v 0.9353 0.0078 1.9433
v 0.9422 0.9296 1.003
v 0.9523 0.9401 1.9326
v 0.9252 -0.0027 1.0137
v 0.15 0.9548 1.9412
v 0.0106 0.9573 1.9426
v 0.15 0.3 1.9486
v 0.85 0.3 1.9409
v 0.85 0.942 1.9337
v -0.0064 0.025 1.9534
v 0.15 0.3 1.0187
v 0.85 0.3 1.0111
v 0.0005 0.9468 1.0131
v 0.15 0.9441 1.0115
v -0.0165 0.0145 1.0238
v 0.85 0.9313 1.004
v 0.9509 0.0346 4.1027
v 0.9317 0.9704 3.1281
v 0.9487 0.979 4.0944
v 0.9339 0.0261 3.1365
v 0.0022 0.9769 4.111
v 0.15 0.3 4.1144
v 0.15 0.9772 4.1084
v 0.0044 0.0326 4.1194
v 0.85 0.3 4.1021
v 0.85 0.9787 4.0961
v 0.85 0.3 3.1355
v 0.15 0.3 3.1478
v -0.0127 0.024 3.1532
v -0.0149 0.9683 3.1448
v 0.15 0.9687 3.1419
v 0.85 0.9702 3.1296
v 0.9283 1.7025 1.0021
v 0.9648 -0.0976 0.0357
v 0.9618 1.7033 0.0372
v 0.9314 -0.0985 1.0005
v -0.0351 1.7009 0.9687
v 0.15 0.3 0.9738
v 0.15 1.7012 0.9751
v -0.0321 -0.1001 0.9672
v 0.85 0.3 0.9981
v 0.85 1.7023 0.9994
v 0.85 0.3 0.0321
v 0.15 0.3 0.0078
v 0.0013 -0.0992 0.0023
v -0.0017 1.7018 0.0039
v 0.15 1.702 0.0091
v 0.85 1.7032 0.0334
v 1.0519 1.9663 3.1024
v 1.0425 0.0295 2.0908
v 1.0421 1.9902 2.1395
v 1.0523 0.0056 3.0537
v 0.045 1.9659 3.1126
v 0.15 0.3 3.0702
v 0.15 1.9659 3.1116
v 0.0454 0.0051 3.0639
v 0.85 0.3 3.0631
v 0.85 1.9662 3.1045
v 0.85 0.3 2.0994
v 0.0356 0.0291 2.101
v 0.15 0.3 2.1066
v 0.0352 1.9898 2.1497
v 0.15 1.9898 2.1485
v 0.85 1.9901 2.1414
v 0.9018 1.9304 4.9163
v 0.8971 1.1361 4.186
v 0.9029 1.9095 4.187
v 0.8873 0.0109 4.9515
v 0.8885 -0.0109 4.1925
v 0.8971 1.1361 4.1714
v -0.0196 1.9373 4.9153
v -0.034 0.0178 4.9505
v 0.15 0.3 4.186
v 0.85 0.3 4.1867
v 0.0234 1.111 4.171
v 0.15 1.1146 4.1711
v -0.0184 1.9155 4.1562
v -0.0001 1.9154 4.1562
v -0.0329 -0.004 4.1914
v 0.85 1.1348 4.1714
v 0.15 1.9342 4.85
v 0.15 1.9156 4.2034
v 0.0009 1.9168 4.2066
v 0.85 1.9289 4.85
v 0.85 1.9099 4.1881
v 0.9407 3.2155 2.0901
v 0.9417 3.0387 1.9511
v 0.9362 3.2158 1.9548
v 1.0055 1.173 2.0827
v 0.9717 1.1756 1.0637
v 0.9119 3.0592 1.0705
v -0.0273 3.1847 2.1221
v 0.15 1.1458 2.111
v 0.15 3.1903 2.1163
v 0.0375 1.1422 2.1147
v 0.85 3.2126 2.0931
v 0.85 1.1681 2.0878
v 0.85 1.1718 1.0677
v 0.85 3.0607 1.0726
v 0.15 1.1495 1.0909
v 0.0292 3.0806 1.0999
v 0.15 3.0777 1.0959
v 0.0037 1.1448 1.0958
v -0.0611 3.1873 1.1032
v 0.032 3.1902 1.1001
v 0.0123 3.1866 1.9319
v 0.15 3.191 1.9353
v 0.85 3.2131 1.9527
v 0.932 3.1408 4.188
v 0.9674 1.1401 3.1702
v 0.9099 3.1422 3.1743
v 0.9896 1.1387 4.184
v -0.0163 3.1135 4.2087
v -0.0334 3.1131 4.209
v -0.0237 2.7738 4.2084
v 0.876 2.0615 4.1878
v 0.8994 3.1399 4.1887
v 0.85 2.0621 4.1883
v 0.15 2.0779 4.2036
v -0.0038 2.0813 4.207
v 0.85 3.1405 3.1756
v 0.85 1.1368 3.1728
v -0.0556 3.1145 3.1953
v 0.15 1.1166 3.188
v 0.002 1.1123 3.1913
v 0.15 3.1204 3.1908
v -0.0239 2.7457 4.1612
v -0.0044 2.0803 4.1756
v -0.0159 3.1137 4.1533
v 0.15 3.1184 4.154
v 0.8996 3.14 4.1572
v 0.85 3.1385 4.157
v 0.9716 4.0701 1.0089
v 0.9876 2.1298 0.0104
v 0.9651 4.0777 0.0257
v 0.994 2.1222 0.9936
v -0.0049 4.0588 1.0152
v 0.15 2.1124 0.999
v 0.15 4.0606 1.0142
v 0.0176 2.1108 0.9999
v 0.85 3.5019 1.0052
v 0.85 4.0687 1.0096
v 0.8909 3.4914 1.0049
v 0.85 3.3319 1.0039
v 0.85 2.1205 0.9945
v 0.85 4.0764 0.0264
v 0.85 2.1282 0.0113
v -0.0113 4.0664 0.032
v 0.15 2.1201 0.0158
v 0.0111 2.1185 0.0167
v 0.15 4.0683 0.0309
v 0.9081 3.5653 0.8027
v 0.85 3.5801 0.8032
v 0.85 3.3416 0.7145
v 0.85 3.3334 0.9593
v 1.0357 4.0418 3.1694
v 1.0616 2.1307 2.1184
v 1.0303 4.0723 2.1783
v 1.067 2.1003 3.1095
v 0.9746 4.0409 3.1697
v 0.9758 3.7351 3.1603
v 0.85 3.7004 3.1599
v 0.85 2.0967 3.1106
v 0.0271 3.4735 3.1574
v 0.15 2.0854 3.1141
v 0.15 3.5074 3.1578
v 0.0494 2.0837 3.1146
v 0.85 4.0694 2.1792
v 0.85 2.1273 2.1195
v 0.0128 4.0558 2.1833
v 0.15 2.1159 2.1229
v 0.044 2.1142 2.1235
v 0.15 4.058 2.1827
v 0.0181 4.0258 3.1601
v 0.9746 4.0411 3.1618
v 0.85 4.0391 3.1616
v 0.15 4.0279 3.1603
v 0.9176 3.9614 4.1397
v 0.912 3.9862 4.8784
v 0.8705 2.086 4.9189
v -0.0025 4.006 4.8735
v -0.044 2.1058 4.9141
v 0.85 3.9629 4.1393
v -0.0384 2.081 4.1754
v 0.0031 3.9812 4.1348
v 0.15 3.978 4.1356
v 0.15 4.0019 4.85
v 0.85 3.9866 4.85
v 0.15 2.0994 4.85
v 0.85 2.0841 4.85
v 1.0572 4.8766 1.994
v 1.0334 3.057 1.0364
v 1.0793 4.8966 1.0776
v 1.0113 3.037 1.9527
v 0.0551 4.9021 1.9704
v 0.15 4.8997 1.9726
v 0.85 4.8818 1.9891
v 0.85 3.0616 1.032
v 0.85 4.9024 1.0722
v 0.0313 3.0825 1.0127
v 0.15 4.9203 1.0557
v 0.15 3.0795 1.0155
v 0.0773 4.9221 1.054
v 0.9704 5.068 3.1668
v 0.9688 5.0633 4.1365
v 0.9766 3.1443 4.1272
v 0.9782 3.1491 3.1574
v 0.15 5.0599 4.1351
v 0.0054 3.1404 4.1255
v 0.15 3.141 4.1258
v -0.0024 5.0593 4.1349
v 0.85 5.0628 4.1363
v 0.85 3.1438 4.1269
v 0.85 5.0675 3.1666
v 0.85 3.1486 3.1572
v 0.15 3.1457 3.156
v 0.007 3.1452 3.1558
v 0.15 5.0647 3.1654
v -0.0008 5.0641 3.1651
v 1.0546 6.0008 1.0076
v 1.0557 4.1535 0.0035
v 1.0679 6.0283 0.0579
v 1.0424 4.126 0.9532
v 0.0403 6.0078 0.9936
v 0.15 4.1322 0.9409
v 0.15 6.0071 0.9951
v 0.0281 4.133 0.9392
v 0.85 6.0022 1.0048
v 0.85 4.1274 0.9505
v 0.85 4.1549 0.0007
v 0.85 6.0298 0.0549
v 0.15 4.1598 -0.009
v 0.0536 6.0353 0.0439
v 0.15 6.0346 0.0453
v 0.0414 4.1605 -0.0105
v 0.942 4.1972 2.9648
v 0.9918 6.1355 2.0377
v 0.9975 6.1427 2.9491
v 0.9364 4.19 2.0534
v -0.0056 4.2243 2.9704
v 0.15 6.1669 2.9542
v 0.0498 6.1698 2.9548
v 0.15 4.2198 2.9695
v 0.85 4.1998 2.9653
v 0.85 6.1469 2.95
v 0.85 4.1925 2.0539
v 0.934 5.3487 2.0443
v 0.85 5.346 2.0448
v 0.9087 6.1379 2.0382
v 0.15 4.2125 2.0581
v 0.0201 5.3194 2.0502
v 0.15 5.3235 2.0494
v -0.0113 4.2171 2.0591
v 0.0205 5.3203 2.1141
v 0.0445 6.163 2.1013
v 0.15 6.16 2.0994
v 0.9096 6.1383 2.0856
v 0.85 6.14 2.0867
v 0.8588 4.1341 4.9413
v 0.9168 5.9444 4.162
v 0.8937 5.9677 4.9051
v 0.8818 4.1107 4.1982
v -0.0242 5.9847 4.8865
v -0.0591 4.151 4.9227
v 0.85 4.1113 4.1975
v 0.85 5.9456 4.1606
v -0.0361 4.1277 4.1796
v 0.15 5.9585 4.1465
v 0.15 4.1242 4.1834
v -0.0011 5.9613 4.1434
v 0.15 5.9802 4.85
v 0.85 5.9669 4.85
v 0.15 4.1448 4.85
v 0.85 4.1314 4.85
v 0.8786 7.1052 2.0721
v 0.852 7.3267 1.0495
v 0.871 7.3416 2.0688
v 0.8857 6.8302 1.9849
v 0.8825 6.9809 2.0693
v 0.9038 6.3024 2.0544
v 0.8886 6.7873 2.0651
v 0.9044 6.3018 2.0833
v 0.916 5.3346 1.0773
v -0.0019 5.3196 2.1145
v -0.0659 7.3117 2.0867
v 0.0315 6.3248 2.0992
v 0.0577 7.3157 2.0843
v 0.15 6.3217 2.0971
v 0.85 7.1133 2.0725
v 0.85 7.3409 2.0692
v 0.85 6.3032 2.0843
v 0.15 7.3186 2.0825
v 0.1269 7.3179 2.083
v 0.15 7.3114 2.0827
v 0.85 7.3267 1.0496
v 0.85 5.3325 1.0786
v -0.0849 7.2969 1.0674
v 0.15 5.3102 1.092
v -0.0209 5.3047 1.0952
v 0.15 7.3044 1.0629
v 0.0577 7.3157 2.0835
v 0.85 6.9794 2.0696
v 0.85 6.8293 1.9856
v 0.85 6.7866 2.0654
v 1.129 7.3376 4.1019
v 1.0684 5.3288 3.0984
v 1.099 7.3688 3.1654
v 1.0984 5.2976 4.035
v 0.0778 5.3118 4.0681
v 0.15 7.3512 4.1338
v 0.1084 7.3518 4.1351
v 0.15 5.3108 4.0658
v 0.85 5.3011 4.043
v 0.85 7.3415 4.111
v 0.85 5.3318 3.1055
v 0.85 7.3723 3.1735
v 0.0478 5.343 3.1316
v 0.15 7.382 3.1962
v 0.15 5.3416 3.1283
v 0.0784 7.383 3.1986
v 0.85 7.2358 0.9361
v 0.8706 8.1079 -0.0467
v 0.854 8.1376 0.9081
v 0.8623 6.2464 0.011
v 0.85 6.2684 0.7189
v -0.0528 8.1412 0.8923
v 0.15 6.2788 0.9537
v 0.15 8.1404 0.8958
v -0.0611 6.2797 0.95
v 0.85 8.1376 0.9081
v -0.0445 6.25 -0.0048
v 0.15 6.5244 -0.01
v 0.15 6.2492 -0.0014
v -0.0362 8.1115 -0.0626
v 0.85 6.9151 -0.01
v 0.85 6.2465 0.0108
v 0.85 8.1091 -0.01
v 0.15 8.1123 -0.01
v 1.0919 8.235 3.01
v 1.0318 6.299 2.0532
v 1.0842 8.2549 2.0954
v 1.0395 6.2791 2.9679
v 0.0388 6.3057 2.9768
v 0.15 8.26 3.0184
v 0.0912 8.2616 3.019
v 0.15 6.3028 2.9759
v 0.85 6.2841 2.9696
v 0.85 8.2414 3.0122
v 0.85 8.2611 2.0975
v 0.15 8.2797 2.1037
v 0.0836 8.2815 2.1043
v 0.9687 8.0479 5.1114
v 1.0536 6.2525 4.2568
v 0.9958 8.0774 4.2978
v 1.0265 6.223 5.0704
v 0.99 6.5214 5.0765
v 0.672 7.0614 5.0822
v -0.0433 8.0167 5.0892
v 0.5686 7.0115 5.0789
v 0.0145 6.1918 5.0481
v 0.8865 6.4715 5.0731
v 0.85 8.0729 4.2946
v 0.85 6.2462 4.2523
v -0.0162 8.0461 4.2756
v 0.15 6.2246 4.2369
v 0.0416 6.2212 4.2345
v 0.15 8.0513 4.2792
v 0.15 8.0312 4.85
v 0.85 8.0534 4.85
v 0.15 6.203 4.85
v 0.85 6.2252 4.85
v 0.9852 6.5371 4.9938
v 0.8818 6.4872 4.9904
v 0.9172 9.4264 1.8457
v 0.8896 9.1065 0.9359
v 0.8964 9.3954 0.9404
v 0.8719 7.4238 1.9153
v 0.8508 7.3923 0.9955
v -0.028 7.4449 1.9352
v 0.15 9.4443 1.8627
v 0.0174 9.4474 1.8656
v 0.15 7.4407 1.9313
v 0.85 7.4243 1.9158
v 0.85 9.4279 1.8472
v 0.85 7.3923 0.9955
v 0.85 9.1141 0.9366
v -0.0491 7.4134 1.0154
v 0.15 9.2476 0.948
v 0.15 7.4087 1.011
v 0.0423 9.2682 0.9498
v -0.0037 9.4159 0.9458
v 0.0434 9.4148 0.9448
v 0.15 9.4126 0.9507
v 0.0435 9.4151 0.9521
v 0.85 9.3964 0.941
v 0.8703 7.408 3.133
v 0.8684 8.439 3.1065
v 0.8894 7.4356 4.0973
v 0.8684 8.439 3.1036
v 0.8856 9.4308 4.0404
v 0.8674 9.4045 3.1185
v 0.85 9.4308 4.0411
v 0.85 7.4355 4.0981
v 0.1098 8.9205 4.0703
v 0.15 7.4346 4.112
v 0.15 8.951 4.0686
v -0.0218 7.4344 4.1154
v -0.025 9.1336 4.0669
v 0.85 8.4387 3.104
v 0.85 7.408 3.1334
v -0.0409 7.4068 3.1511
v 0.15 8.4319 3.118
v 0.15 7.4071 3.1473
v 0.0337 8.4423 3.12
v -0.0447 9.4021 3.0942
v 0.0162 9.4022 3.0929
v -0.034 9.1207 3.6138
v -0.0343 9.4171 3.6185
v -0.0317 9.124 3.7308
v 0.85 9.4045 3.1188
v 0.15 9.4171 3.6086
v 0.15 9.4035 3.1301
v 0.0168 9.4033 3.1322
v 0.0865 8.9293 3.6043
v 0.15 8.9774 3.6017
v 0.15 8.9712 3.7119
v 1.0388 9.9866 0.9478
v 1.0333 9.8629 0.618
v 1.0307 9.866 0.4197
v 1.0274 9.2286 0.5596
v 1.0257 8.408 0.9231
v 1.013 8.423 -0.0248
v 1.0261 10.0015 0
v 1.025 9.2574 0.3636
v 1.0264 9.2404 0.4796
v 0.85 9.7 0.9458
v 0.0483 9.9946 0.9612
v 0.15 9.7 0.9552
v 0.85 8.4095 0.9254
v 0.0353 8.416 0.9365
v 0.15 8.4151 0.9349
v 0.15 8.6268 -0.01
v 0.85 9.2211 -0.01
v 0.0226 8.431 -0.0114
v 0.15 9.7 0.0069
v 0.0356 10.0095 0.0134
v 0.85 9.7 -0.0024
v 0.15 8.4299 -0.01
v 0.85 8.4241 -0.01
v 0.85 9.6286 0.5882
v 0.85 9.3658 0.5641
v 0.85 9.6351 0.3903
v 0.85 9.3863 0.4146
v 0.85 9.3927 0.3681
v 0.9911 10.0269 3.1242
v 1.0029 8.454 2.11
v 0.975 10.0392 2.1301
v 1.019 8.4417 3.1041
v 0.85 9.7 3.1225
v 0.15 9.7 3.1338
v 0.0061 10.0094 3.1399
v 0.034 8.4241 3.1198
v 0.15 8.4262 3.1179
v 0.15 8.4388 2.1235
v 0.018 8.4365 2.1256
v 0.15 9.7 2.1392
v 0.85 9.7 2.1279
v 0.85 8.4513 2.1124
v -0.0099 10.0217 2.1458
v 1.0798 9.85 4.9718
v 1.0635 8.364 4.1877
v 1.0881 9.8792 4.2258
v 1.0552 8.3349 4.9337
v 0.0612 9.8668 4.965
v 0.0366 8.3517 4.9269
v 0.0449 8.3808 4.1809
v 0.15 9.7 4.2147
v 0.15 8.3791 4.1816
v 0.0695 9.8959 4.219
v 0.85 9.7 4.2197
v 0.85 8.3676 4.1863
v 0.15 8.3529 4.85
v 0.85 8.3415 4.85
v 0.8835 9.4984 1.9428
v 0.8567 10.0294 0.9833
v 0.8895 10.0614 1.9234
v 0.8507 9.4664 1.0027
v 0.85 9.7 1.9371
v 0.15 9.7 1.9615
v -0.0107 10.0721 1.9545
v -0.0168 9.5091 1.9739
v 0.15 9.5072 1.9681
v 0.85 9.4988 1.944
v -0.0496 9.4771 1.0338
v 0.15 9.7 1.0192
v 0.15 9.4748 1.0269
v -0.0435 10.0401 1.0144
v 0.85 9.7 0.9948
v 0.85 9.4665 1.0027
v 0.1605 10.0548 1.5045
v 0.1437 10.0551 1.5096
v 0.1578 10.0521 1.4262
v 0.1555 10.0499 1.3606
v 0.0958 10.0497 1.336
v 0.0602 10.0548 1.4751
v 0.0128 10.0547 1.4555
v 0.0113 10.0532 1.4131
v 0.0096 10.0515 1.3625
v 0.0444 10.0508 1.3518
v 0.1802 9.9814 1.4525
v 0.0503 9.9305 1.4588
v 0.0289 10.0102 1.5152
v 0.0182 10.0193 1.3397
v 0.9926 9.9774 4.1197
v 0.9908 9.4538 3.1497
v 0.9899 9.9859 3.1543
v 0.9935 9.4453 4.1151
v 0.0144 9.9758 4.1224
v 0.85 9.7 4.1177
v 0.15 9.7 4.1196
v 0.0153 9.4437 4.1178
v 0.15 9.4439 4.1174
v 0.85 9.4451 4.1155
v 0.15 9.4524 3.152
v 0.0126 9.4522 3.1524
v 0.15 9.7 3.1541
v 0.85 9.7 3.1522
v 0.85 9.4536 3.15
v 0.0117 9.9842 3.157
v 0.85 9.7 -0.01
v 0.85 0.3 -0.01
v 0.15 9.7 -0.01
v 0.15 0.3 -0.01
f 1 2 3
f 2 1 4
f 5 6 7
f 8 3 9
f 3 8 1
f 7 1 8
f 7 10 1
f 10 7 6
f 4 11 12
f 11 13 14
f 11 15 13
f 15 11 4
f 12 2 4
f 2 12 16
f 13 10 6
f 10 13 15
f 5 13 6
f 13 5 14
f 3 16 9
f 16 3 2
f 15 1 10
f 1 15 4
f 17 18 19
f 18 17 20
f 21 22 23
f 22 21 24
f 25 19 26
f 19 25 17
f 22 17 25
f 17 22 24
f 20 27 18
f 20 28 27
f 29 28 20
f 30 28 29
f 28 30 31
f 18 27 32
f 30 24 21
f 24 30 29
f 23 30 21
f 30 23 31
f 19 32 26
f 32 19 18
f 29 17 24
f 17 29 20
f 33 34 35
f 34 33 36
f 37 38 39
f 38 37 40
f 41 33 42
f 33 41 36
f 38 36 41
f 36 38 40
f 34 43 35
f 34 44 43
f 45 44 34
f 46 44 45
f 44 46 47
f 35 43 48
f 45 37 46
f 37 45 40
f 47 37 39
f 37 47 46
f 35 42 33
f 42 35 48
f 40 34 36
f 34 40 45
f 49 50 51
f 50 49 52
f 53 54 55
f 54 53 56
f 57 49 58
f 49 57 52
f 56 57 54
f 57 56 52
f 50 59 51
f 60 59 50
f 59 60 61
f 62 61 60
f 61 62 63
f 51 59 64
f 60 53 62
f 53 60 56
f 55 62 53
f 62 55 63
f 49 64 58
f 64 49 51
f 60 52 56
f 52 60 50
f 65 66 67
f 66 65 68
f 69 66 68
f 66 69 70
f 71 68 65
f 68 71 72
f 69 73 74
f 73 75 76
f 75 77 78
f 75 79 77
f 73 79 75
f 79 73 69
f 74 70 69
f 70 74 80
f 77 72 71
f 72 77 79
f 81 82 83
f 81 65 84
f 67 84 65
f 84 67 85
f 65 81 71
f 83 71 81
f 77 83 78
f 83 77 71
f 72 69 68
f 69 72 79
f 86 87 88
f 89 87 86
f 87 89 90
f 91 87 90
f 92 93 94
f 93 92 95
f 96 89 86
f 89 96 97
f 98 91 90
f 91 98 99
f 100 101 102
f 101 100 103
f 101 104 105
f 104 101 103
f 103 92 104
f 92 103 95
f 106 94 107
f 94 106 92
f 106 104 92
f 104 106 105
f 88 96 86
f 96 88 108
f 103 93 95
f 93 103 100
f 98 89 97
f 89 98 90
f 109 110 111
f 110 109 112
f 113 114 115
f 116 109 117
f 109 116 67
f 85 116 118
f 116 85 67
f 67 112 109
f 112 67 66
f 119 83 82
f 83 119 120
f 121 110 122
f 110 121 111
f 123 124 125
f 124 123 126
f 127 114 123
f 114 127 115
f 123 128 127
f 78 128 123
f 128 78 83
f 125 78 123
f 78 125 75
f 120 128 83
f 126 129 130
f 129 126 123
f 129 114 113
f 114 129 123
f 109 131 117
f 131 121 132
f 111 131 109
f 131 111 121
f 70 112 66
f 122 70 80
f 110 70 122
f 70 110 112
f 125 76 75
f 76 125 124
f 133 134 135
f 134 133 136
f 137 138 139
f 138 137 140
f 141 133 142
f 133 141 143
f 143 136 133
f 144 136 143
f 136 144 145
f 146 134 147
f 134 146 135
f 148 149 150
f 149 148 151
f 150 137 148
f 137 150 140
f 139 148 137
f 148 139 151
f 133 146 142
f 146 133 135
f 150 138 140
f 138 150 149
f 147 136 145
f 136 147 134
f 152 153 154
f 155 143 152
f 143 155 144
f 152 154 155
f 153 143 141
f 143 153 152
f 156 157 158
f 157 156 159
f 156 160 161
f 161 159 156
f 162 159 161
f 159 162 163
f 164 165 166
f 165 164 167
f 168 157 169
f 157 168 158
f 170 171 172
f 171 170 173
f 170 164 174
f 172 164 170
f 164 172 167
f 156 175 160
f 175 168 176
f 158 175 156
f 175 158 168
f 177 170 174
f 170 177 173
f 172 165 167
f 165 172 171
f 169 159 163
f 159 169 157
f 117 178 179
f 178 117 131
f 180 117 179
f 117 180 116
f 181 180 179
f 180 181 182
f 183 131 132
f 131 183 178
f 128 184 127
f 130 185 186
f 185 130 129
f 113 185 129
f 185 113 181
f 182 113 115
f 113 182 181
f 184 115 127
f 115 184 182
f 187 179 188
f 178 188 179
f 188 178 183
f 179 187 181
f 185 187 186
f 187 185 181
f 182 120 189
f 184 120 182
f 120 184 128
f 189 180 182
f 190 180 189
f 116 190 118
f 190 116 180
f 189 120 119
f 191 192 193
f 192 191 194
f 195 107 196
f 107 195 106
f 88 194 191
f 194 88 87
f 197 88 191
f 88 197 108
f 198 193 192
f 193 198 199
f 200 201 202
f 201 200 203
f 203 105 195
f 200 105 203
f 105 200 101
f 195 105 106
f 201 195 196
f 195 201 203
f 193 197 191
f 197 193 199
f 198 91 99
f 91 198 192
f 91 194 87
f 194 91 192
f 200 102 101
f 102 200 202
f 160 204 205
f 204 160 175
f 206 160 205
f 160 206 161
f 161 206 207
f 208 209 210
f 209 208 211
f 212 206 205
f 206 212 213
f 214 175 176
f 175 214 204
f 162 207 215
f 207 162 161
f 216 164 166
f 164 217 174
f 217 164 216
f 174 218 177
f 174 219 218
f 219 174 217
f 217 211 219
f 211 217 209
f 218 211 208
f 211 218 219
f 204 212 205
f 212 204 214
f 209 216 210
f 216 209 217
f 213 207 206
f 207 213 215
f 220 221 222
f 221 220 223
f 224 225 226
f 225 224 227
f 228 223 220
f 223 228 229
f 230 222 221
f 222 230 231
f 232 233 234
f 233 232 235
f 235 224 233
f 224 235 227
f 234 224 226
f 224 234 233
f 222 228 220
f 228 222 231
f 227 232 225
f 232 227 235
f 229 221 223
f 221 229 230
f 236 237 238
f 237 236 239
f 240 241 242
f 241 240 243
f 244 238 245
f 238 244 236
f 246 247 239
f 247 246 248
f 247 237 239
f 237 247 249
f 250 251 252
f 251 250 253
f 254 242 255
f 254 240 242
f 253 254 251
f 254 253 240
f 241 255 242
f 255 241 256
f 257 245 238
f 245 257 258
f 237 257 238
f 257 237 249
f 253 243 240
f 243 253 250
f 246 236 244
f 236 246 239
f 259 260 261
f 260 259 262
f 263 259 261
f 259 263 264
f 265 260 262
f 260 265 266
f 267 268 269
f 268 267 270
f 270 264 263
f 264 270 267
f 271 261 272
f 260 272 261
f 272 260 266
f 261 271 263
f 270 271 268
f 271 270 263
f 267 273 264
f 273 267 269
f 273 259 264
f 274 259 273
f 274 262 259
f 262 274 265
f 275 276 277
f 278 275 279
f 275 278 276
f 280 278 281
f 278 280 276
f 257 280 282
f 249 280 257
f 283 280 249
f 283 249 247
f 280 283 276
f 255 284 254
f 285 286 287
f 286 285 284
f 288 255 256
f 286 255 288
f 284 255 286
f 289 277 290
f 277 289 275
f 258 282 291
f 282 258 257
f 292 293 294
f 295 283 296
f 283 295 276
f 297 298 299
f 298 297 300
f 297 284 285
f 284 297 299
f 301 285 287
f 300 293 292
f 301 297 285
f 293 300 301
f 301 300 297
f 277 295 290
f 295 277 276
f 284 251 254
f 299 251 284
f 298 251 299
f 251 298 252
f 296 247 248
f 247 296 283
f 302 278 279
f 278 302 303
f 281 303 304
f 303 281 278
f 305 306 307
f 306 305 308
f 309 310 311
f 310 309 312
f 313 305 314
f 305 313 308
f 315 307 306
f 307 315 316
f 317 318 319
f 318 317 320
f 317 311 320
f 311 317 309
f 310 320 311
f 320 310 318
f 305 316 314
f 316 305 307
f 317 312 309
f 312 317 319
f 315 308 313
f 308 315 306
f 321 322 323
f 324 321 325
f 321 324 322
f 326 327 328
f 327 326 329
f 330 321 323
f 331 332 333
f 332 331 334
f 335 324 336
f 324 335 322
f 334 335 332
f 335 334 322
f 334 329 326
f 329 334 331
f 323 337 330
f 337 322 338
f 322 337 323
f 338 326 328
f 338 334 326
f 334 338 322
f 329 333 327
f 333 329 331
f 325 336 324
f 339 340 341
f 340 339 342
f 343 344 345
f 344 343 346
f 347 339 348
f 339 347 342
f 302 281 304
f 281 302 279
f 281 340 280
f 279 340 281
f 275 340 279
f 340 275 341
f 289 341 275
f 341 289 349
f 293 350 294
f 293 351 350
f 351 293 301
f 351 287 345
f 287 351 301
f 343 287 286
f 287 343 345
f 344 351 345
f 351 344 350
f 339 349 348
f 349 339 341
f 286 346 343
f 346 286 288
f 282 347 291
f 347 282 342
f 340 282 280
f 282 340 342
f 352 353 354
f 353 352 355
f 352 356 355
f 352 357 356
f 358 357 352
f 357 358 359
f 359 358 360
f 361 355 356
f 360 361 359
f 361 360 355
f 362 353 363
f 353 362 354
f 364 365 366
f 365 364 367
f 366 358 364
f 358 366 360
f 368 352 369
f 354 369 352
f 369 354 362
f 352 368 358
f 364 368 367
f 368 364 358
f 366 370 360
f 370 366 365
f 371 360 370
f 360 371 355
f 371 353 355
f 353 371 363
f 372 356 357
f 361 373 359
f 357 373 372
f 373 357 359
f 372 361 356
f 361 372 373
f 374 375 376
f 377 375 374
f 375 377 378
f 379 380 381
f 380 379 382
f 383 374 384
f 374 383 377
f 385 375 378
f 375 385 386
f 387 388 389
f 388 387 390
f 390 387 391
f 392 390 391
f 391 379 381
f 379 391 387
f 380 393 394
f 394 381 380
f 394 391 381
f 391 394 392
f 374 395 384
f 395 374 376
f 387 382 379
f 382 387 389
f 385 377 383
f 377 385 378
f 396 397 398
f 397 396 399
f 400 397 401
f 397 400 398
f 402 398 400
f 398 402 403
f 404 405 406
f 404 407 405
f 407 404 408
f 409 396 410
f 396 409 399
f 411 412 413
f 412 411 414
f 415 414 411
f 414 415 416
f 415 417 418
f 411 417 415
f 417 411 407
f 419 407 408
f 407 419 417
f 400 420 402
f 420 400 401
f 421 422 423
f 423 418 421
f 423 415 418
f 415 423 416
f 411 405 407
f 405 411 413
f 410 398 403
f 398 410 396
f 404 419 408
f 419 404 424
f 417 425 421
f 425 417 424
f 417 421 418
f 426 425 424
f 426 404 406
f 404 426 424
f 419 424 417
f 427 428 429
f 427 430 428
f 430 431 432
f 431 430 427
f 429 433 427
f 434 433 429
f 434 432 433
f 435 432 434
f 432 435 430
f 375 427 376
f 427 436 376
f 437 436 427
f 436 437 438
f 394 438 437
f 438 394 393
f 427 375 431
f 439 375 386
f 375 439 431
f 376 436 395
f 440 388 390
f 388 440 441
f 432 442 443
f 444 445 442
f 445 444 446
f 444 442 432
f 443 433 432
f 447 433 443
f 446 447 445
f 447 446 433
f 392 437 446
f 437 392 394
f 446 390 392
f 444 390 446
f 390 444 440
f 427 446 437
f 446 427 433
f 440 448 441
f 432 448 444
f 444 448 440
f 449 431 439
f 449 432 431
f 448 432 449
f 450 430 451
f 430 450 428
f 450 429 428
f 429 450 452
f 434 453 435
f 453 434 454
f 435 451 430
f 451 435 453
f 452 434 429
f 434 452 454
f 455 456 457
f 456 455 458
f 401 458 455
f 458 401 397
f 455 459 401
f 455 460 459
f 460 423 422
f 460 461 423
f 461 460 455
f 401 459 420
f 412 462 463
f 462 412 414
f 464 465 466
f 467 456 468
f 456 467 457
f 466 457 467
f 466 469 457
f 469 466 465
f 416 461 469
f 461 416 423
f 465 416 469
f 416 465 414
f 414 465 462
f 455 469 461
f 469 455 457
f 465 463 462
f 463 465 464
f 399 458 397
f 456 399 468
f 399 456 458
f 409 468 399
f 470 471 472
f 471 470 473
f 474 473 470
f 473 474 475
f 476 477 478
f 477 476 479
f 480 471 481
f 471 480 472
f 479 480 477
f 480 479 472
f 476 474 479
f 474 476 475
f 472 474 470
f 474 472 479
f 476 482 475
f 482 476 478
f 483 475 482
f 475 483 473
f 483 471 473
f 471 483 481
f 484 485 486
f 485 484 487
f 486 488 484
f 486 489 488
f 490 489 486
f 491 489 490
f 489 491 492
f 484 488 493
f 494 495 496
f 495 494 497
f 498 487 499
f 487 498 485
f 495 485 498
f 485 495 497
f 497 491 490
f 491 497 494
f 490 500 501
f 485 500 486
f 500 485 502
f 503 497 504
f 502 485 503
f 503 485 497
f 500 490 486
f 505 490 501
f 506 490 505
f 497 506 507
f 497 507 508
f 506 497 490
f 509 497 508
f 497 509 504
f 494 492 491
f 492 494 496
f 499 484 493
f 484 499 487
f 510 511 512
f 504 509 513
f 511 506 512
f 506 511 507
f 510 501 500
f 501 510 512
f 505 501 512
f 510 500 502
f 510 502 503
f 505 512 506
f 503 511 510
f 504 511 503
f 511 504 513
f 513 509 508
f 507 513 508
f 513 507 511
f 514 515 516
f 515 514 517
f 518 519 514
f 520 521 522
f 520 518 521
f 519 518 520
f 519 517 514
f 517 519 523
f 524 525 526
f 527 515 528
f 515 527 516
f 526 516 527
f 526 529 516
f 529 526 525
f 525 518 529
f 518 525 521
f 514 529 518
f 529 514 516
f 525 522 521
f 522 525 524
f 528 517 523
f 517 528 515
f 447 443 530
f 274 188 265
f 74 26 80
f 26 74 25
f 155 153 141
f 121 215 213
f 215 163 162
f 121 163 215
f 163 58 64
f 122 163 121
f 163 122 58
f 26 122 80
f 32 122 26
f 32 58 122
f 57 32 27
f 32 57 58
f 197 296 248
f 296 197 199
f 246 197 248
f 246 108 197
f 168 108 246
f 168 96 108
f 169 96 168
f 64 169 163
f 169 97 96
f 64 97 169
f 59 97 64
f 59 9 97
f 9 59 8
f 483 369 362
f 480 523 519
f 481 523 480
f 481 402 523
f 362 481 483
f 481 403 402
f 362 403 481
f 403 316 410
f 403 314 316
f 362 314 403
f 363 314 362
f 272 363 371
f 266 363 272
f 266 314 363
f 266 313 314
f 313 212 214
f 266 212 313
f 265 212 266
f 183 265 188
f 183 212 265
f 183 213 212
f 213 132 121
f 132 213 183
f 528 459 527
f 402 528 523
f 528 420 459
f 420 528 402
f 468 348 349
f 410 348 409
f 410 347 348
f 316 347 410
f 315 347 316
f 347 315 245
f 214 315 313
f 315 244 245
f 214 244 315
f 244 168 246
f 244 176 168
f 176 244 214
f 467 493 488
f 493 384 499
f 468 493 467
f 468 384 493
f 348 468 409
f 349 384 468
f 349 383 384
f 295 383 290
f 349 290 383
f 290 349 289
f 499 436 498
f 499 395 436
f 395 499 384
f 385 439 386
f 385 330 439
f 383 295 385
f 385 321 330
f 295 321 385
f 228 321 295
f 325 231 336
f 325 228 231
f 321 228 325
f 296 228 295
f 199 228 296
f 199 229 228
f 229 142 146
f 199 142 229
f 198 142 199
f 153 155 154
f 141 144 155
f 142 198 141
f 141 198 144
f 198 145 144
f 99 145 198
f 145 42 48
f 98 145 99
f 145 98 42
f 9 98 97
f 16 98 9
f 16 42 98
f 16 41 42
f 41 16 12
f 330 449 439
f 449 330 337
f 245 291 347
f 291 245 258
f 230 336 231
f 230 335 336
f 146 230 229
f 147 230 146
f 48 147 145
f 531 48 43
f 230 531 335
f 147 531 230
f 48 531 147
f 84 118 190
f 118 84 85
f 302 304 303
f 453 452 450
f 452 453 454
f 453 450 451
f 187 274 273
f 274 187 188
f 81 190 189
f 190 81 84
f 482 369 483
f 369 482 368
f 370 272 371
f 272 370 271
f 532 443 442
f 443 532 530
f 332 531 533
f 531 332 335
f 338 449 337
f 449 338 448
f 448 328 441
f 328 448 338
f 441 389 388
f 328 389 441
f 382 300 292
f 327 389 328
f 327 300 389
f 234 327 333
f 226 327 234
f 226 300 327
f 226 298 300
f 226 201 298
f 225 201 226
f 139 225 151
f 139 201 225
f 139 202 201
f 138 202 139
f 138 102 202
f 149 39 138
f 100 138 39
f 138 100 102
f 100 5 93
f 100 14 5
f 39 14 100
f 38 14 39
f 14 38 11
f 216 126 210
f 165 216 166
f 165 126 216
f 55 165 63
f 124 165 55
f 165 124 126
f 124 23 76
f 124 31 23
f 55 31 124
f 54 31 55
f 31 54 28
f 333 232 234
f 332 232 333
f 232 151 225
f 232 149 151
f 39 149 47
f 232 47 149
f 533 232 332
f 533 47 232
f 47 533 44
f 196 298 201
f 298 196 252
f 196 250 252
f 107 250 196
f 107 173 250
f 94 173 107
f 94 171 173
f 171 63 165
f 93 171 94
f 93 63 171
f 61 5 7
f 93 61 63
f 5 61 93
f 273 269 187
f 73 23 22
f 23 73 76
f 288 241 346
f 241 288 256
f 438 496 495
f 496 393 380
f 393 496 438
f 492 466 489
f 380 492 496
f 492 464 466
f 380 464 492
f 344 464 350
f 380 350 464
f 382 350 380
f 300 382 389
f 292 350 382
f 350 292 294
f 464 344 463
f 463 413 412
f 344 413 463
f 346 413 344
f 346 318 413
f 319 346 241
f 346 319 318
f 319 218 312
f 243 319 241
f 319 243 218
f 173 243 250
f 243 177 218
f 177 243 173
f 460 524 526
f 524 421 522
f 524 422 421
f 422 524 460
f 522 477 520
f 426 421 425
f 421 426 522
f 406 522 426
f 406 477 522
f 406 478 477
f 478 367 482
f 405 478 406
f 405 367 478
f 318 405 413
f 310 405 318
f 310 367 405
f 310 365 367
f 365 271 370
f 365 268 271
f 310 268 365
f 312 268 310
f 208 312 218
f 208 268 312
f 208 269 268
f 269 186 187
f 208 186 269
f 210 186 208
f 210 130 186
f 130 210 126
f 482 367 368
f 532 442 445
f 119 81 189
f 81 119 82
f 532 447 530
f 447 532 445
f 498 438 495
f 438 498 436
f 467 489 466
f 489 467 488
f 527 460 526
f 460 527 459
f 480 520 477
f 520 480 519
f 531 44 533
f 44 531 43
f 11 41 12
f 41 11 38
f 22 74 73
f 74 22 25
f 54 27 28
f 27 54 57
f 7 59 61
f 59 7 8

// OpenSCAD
// file: bricks/brick_mod_cracked.scad
// ======================================
// = Brick Mod random translate         =
// = Jacob Loss                         =
// = 03/08/2022                         =
// = GNU GPLv3.0                        =
// ======================================

// Randomly scale bricks between s_min, s_max
module brick_mod_cracked(
    size,
    chance = 0.25,
    min_angle = [-45, 0, -45],
    max_angle = [45, 0, 45],
    min_size = [0.05, 0.05, 0.05],
    max_size = [0.95, 0.95, 0.95],
    min_tran = [0.05, 0.05, 0.05],
    max_tran = [0.95, 0.95, 0.95],
    seed
    ){

    // Undefined global protection
    // These only sometimes work?
    size = is_undef(size) ? $bs     : size;
    seed = is_undef(seed) ? $seed   : seed;

    r_vals = rands(0, 100000, 10, seed);

    tr =[
        size[0] * rands(min_tran[0], max_tran[0], 1, r_vals[0])[0],
        size[1] * rands(min_tran[1], max_tran[1], 1, r_vals[1])[0],
        size[2] * rands(min_tran[2], max_tran[2], 1, r_vals[2])[0] 
        ];

    rot=[
        rands(min_angle[0], max_angle[0], 1, r_vals[3])[0], 
        rands(min_angle[1], max_angle[1], 1, r_vals[4])[0], 
        rands(min_angle[2], max_angle[2], 1, r_vals[5])[0] 
        ]; 

    cut=[
        size[0] * rands(0, max_size[0], 1, r_vals[6])[0],
        size[1] * rands(0, max_size[1], 1, r_vals[7])[0],
        size[2] * rands(0, max_size[2], 1, r_vals[8])[0]
        ];

    en = rands(0, 1, 1, r_vals[9])[0];
    if(en <= chance){

        difference(){

            children(0);
            translate(tr)
            rotate(rot)
            cube(cut);
    
        }
    }else{
        children(0);
    }
}
// file: bricks/brick_mod_r_tra.scad
// ======================================
// = Brick Mod random translate         =
// = Jacob Loss                         =
// = 03/08/2022                         =
// = GNU GPLv3.0                        =
// ======================================

// Randomly scale bricks between s_min, s_max
module brick_mod_r_translate(
    size,
    t_min = [-0.05, -0.05, -0.05],
    t_max = [0.05, 0.05, 0.05],
    trim = false,
    seed
    ){

    // Undefined global protection
    // These only sometimes work?
    size = is_undef(size) ? $bs     : size;
    seed = is_undef(seed) ? $seed   : seed;

    r_vals = rands(0, 100000, 3, seed);

    tr = [
        rands(size[0] * t_min[0], size[0] * t_max[0], 1, r_vals[0])[0],
        rands(size[1] * t_min[1], size[1] * t_max[1], 1, r_vals[1])[0],
        rands(size[2] * t_min[2], size[2] * t_max[2], 1, r_vals[2])[0] 
    ];

    if(trim){
        intersection(){
            translate(tr)
            children(0);
            cube(size);
        }
    } else {
        translate(tr)
        children(0);
    }
}
// file: bricks/brick_mod_r_scl.scad
// ======================================
// = Brick Mod random scale             =
// = Jacob Loss                         =
// = 03/08/2022                         =
// = GNU GPLv3.0                        =
// ======================================

// Randomly scale bricks between s_min, s_max
module brick_mod_r_scale(
    size,
    s_min = [0.95, 0.95, 0.95],
    s_max = [1.05, 1.05, 1.05],
    trim = false,
    seed
    ){

    // Undefined global protection
    // These only sometimes work?
    size = is_undef(size) ? $bs     : size;
    seed = is_undef(seed) ? $seed   : seed;

    r_vals = rands(0, 100000, 3, seed);

    sc = [
        rands(s_min[0], s_max[0], 1, r_vals[0])[0],
        rands(s_min[1], s_max[1], 1, r_vals[1])[0],
        rands(s_min[2], s_max[2], 1, r_vals[2])[0] 
    ];

    if(trim){
        intersection(){
            scale(sc)
            children(0);
            cube(size);
        }
    } else {
        scale(sc)
        children(0);
    }
}
// file: bricks/brick_mod_r_rot.scad
// ==============================================
// = Random Rotation Brick Modifier             =
// = Jacob Loss                                 =
// = 02/27/2022                                 =
// = GNU GPLv3.0                                =
// ==============================================

// Randomly rotate brick by r_max degrees
module brick_mod_r_rot(
    size,
    r_max = [5, 5, 5],
    trim = false,
    seed
    ){

    // Undefined global protection
    // These only sometimes work?
    size = is_undef(size) ? $bs     : size;
    seed = is_undef(seed) ? $seed   : seed;

    r_vals = rands(0, 100000, 3, seed);

    rot = [
        rands(-r_max[0], r_max[0], 1, r_vals[0])[0],
        rands(-r_max[1], r_max[1], 1, r_vals[1])[0],
        rands(-r_max[2], r_max[2], 1, r_vals[2])[0] 
    ];

    if(trim){
        intersection(){
            rotate(rot)
            children(0);
            cube(size);
        }
    } else {
        rotate(rot)
        children(0);
    }
}
// file: bricks/brick_round.scad
// ==============================================
// = Rounded Brick                              =
// = Jacob Loss                                 =
// = 02/27/2022                                 =
// = GNU GPLv3.0                                =
// ==============================================

// Generic Brick to be used as a template for the future
module brick_round(
    size,
    radius = 0.25    
    ){

    // Undefined global protection
    // These only sometimes work?
    size = is_undef(size) ? $bs     : size;
    // No randomness to this one
    //seed = is_undef(seed) ? $seed   : seed;

    if($d){                                                 // Debug mode (just a cube)
        cube(size);
    } else {                                                // Run mode
        intersection(){ 
        difference(){
            cube(size, center=false);
            // Cutter
            union(){
                
                translate([0, radius, radius])
                rotate([180, 0, 0])
                difference(){
                    cube([size[0], radius, radius]);
                    rotate([0, 90, 0])
                    cylinder(r = radius, h = size[0]);
                }
                
                translate([0, size[1] - radius, radius])
                rotate([-90, 0, 0])
                difference(){
                    cube([size[0], radius, radius]);
                    rotate([0, 90, 0])
                    cylinder(r = radius, h = size[0]);
                }
                
                translate([0, radius, size[2] - radius])
                rotate([90, 0, 0])
                difference(){
                    cube([size[0], radius, radius]);
                    rotate([0, 90, 0])
                    cylinder(r = radius, h = size[0]);
                }
                
                translate([0, size[1] - radius, size[2] - radius])
                rotate([0, 0, 0])
                difference(){
                    cube([size[0], radius, radius]);
                    rotate([0, 90, 0])
                    cylinder(r = radius, h = size[0]);
                }
                
                translate([radius, 0, radius])
                rotate([0, 180, 0])
                difference(){
                    cube([radius, size[1], radius]);
                    rotate([-90, 0, 0])
                    cylinder(r = radius, h = size[1]);
                }
                
                translate([size[0] - radius, 0, radius])
                rotate([0, 90, 0])
                difference(){
                    cube([radius, size[1], radius]);
                    rotate([-90, 0, 0])
                    cylinder(r = radius, h = size[1]);
                }
                
                translate([size[0] - radius, 0, size[2] - radius])
                rotate([0, 0, 0])
                difference(){
                    cube([radius, size[1], radius]);
                    rotate([-90, 0, 0])
                    cylinder(r = radius, h = size[1]);
                }
                
                translate([radius, 0, size[2] - radius])
                rotate([0, -90, 0])
                difference(){
                    cube([radius, size[1], radius]);
                    rotate([-90, 0, 0])
                    cylinder(r = radius, h = size[1]);
                }
                
                translate([radius, radius, 0])
                rotate([0, 0, 180])
                difference(){
                    cube([radius, radius, size[2]]);
                    rotate([0, 0, 0])
                    cylinder(r = radius, h = size[2]);
                }
                
                translate([radius, size[1] - radius, 0])
                rotate([0, 0, 90])
                difference(){
                    cube([radius, radius, size[2]]);
                    rotate([0, 0, 0])
                    cylinder(r = radius, h = size[2]);
                }
                
                translate([size[0] - radius, size[1] - radius, 0])
                rotate([0, 0, 0])
                difference(){
                    cube([radius, radius, size[2]]);
                    rotate([0, 0, 0])
                    cylinder(r = radius, h = size[2]);
                }
                
                translate([size[0] - radius, radius, 0])
                rotate([0, 0, -90])
                difference(){
                    cube([radius, radius, size[2]]);
                    rotate([0, 0, 0])
                    cylinder(r = radius, h = size[2]);
                }
                
                translate([radius, radius, radius])
                rotate([0, 90, 180])
                difference(){
                    cube([radius, radius, radius]);
                    sphere(r = radius * 1.01);
                }
                
                translate([size[0] - radius, size[1] - radius, radius])
                rotate([0, 90, 0])
                difference(){
                    cube([radius, radius, radius]);
                    sphere(r = radius * 1.01);
                }
                
                translate([radius, size[1] - radius, radius])
                rotate([0, 90, 90])
                difference(){
                    cube([radius, radius, radius]);
                    sphere(r = radius * 1.01);
                }
                
                translate([size[0] - radius, radius, radius])
                rotate([0, 90, -90])
                difference(){
                    cube([radius, radius, radius]);
                    sphere(r = radius * 1.01);
                }
                
                translate([size[0] - radius, size[1] - radius, size[2] - radius])
                rotate([0, 0, 0])
                difference(){
                    cube([radius, radius, radius]);
                    sphere(r = radius * 1.01);
                }
                
                translate([radius, size[1] - radius, size[2] - radius])
                rotate([0, 0, 90])
                difference(){
                    cube([radius, radius, radius]);
                    sphere(r = radius * 1.01);
                }
                
                translate([radius, radius, size[2] - radius])
                rotate([0, 0, 180])
                difference(){
                    cube([radius, radius, radius]);
                    sphere(r = radius * 1.01);
                }
                
                translate([size[0] - radius, radius, size[2] - radius])
                rotate([0, 0, -90])
                difference(){
                    cube([radius, radius, radius]);
                    sphere(r = radius * 1.01);
                }
            }
            }

            translate(size * 0.0005)
            cube(size = size * 0.999, center = false);

        }
    }
}

module _OSBK_test_suite(){
    $d = false;
    $bs = [1, 2, 1];
    $fn = 50;   
 
    for(i = [0 : 10]){
         
        //$seed = r_vals[i];
        
        translate([0, i * 2, 0])
        children(0);
    }

}

module _OSBK_test_brick_generic(){
    _OSBK_test_suite()
    brick_round();
}
_OSBK_test_brick_generic();
// file: bricks/brick_set.scad
// ======================
// = Set-o-Bricks       =
// = Jacob Loss         =
// = 01/30/2022         =
// = GNU GPLv3.0        =
// ======================

// Get generic brick (mostly for the test suite)
use <brick_generic.scad>

// Default Brick Set
// Format : [stlSize, stlFile]
_pbs_test_bricks = [
                        [[1, 2, 1], "test_brick_set/brick0.stl"],
                        [[1, 2, 1], "test_brick_set/brick1.stl"],
                        [[1, 2, 1], "test_brick_set/brick3.stl"],
                    ];

// Place a Brick based on a set of bricks
module brick_set( 
    size = [1, 2, 1],               // Size of brick
    set = _pbs_test_bricks,         // Set of brick, Entry: [[size_x, size_y, size_z], "FileName.stl"]
    stdev = 0.75,                   // Standard Deviation for random brick laying
    ){
    
    // Undefined global protection
    size = is_undef(size) ? $bs     : size;
    seed = is_undef(seed) ? $seed   : seed;
    
    if($d){

        cube(size);

    } else {
        intersection(){
            union(){
                // Random values from the $seed      
                r_vals = rands(0, 10000, 4, $seed);
     
                // Select Brick
                i       = round(r_vals[0]) % len(set);
           
                // Get Rotations
                r_x     = round(r_vals[1]) % 2;
                r_y     = round(r_vals[2]) % 4;
                r_z     = round(r_vals[3]) % 2;

                // Get all brick values and transforms
                c_brick = set[i];
                s_brick = [size[0] / c_brick[0][0], size[1] / c_brick[0][1], size[2] / c_brick[0][2]];
                r_brick = [r_x * 180, r_y * 90, r_z * 180];   
                
                // Generate Brick 
                scale(s_brick)
                translate(c_brick[0] / 2)
                rotate([r_x * 180, r_y * 90,  r_z * 180])
                import(c_brick[1]);
            }
            cube(size);
        }
    }
}

module _OSBK_test_brick_set(){

    _OSBK_test_suite()
    brick_set();

}
_OSBK_test_brick_set();
// file: bricks/brick_intersect.scad
// ==============================================
// = Intersected Bricks                         =
// = Jacob Loss                                 =
// = 02/12/2022                                 =
// = CC BY-SA 3.0                               =
// = Remixed from:                              =
// = https://www.thingiverse.com/thing:219574   = 
// ==============================================

// Get generic brick (mostly for the test suite)
use <brick_generic.scad>

// Intersection Bricks
module brick_inter(
    size,
    seed,
    max_a   = 10,
    n       = 3,
    ){

    // Undefined global protection
    size = is_undef(size) ? $bs     : size;
    seed = is_undef(seed) ? $seed   : seed;
    
    z = rands(-1, 1, n * 3, seed);

    if($d){
        cube(size);
    } else {
        intersection(){
            
            translate(size / 2)
            intersection_for(i = [0:n-1]){
               
                //echo("i =", i);
                // echo("z =", z);
                //echo("max_a =", max_a);
                
                rotate([
                        max_a * z[3 * i + 0],
                        max_a * z[3 * i + 1],
                        max_a * z[3 * i + 2],
                       ])
                cube(size, center=true);

            }

            cube(size);
        }        

    }
}

module _OSBK_test_brick_inter(){

    _OSBK_test_suite()
    brick_inter();
 
}
_OSBK_test_brick_inter();
// file: bricks/brick_generic.scad
// ==============================================
// = Generic Brick                              =
// = Jacob Loss                                 =
// = 02/12/2022                                 =
// = GNU GPLv3.0                                =
// ==============================================

// Generic Brick to be used as a template for the future
module brick_generic(
    size,
    rand = true,
    seed
    ){

    // Undefined global protection
    // These only sometimes work?
    size = is_undef(size) ? $bs     : size;
    seed = is_undef(seed) ? $seed   : seed;
    
    r       = 1;
    r_min   = 0;
    r_max   = 1;
    r_val   = rands(r_min, r_max, r, seed);

    if($d){                                                 // Debug mode (just a cube)
        cube(size);
    } else {                                                // Run mode 
        intersection(){
           
            union(){                                        // Where the magic happens
                r_size = rand ? size * r_val[0] : size;     // Randomly scale brick [0, 1]
                cube(r_size, center=false);
            }

            cube(size);                                     // Cut brick so it is always smaller than size
        }        

    }
}

module _OSBK_test_suite(){
    $d = false;
    $bs = [1, 2, 1];
    r_vals = rands(0, 10000, 11, 1234);
    
    for(i = [0 : 10]){
         
        $seed = r_vals[i];
        
        translate([0, i * 2, 0])
        children(0);
    }

}

module _OSBK_test_brick_generic(){
    _OSBK_test_suite()
    brick_generic();
}
_OSBK_test_brick_generic();
// file: bricks/OSBK_bricks.scad
// ==============================================
// = OSBK Bricks                                =
// = Jacob Loss                                 =
// = 02/12/2022                                 =
// = GNU GPLv3.0                                =
// ==============================================

// This just gets all of the bricks
include <brick_generic.scad>
include <brick_intersect.scad>
include <brick_set.scad>
include <brick_round.scad>

include <brick_mod_r_rot.scad>
include <brick_mod_r_scl.scad>
include <brick_mod_r_tra.scad>

include <brick_mod_cracked.scad>
// file: OSBK.scad
// ==============================
// = OpenSCAD Builder's Kit     =
// = Jacob Loss                 =
// = 02/12/2022                 =
// = GNU GPLv3.0                =
// ==============================

// Include all needed stuffs
use <bricks/OSBK_bricks.scad>
use <part_pillar.scad>
use <part_wall.scad>
// main file
// ======================================
// = OSBK Test Examples                 =
// = Jacob Loss                         =
// = 02/27/2022                         =
// = GNU GPLv3.0                        =
// ======================================

// This is a collection of tests for the Library and some of the other features. 

// Get the library
include <OSBK.scad>
include <MCAD/units.scad>

// Debug mode
$d = false;
$fn = 25;

// Default brick
module brick_mod1(){

    
    brick_mod_r_rot(r_max = [2, 2, 2], trim = false)
    brick_mod_r_translate(t_min = [-0.05, -0.05, -0.05], t_max = [0.05, 0.05, 0.05])
    brick_mod_r_scale(s_min = [0.9, 0.9, 0.9], s_max = [1.025, 1.025, 1.025])
    brick_mod_cracked(chance = 0.25)
    brick_generic(rand = false);

}


build_wall(
    length      = 10,        
    height      = 5,         
    b_size      = [1, 2, 1],          
    b_sides     = [1, 1, 1, 1, 1, 0], 
    depth       = 0.15,               
    v_gap       = 0.05,           
    v_off       = 0.0,           
    h_gap       = 0.05,           
    h_off       = 0,
    int_block   = true,
    seed        = 125468
)
brick_mod1();
